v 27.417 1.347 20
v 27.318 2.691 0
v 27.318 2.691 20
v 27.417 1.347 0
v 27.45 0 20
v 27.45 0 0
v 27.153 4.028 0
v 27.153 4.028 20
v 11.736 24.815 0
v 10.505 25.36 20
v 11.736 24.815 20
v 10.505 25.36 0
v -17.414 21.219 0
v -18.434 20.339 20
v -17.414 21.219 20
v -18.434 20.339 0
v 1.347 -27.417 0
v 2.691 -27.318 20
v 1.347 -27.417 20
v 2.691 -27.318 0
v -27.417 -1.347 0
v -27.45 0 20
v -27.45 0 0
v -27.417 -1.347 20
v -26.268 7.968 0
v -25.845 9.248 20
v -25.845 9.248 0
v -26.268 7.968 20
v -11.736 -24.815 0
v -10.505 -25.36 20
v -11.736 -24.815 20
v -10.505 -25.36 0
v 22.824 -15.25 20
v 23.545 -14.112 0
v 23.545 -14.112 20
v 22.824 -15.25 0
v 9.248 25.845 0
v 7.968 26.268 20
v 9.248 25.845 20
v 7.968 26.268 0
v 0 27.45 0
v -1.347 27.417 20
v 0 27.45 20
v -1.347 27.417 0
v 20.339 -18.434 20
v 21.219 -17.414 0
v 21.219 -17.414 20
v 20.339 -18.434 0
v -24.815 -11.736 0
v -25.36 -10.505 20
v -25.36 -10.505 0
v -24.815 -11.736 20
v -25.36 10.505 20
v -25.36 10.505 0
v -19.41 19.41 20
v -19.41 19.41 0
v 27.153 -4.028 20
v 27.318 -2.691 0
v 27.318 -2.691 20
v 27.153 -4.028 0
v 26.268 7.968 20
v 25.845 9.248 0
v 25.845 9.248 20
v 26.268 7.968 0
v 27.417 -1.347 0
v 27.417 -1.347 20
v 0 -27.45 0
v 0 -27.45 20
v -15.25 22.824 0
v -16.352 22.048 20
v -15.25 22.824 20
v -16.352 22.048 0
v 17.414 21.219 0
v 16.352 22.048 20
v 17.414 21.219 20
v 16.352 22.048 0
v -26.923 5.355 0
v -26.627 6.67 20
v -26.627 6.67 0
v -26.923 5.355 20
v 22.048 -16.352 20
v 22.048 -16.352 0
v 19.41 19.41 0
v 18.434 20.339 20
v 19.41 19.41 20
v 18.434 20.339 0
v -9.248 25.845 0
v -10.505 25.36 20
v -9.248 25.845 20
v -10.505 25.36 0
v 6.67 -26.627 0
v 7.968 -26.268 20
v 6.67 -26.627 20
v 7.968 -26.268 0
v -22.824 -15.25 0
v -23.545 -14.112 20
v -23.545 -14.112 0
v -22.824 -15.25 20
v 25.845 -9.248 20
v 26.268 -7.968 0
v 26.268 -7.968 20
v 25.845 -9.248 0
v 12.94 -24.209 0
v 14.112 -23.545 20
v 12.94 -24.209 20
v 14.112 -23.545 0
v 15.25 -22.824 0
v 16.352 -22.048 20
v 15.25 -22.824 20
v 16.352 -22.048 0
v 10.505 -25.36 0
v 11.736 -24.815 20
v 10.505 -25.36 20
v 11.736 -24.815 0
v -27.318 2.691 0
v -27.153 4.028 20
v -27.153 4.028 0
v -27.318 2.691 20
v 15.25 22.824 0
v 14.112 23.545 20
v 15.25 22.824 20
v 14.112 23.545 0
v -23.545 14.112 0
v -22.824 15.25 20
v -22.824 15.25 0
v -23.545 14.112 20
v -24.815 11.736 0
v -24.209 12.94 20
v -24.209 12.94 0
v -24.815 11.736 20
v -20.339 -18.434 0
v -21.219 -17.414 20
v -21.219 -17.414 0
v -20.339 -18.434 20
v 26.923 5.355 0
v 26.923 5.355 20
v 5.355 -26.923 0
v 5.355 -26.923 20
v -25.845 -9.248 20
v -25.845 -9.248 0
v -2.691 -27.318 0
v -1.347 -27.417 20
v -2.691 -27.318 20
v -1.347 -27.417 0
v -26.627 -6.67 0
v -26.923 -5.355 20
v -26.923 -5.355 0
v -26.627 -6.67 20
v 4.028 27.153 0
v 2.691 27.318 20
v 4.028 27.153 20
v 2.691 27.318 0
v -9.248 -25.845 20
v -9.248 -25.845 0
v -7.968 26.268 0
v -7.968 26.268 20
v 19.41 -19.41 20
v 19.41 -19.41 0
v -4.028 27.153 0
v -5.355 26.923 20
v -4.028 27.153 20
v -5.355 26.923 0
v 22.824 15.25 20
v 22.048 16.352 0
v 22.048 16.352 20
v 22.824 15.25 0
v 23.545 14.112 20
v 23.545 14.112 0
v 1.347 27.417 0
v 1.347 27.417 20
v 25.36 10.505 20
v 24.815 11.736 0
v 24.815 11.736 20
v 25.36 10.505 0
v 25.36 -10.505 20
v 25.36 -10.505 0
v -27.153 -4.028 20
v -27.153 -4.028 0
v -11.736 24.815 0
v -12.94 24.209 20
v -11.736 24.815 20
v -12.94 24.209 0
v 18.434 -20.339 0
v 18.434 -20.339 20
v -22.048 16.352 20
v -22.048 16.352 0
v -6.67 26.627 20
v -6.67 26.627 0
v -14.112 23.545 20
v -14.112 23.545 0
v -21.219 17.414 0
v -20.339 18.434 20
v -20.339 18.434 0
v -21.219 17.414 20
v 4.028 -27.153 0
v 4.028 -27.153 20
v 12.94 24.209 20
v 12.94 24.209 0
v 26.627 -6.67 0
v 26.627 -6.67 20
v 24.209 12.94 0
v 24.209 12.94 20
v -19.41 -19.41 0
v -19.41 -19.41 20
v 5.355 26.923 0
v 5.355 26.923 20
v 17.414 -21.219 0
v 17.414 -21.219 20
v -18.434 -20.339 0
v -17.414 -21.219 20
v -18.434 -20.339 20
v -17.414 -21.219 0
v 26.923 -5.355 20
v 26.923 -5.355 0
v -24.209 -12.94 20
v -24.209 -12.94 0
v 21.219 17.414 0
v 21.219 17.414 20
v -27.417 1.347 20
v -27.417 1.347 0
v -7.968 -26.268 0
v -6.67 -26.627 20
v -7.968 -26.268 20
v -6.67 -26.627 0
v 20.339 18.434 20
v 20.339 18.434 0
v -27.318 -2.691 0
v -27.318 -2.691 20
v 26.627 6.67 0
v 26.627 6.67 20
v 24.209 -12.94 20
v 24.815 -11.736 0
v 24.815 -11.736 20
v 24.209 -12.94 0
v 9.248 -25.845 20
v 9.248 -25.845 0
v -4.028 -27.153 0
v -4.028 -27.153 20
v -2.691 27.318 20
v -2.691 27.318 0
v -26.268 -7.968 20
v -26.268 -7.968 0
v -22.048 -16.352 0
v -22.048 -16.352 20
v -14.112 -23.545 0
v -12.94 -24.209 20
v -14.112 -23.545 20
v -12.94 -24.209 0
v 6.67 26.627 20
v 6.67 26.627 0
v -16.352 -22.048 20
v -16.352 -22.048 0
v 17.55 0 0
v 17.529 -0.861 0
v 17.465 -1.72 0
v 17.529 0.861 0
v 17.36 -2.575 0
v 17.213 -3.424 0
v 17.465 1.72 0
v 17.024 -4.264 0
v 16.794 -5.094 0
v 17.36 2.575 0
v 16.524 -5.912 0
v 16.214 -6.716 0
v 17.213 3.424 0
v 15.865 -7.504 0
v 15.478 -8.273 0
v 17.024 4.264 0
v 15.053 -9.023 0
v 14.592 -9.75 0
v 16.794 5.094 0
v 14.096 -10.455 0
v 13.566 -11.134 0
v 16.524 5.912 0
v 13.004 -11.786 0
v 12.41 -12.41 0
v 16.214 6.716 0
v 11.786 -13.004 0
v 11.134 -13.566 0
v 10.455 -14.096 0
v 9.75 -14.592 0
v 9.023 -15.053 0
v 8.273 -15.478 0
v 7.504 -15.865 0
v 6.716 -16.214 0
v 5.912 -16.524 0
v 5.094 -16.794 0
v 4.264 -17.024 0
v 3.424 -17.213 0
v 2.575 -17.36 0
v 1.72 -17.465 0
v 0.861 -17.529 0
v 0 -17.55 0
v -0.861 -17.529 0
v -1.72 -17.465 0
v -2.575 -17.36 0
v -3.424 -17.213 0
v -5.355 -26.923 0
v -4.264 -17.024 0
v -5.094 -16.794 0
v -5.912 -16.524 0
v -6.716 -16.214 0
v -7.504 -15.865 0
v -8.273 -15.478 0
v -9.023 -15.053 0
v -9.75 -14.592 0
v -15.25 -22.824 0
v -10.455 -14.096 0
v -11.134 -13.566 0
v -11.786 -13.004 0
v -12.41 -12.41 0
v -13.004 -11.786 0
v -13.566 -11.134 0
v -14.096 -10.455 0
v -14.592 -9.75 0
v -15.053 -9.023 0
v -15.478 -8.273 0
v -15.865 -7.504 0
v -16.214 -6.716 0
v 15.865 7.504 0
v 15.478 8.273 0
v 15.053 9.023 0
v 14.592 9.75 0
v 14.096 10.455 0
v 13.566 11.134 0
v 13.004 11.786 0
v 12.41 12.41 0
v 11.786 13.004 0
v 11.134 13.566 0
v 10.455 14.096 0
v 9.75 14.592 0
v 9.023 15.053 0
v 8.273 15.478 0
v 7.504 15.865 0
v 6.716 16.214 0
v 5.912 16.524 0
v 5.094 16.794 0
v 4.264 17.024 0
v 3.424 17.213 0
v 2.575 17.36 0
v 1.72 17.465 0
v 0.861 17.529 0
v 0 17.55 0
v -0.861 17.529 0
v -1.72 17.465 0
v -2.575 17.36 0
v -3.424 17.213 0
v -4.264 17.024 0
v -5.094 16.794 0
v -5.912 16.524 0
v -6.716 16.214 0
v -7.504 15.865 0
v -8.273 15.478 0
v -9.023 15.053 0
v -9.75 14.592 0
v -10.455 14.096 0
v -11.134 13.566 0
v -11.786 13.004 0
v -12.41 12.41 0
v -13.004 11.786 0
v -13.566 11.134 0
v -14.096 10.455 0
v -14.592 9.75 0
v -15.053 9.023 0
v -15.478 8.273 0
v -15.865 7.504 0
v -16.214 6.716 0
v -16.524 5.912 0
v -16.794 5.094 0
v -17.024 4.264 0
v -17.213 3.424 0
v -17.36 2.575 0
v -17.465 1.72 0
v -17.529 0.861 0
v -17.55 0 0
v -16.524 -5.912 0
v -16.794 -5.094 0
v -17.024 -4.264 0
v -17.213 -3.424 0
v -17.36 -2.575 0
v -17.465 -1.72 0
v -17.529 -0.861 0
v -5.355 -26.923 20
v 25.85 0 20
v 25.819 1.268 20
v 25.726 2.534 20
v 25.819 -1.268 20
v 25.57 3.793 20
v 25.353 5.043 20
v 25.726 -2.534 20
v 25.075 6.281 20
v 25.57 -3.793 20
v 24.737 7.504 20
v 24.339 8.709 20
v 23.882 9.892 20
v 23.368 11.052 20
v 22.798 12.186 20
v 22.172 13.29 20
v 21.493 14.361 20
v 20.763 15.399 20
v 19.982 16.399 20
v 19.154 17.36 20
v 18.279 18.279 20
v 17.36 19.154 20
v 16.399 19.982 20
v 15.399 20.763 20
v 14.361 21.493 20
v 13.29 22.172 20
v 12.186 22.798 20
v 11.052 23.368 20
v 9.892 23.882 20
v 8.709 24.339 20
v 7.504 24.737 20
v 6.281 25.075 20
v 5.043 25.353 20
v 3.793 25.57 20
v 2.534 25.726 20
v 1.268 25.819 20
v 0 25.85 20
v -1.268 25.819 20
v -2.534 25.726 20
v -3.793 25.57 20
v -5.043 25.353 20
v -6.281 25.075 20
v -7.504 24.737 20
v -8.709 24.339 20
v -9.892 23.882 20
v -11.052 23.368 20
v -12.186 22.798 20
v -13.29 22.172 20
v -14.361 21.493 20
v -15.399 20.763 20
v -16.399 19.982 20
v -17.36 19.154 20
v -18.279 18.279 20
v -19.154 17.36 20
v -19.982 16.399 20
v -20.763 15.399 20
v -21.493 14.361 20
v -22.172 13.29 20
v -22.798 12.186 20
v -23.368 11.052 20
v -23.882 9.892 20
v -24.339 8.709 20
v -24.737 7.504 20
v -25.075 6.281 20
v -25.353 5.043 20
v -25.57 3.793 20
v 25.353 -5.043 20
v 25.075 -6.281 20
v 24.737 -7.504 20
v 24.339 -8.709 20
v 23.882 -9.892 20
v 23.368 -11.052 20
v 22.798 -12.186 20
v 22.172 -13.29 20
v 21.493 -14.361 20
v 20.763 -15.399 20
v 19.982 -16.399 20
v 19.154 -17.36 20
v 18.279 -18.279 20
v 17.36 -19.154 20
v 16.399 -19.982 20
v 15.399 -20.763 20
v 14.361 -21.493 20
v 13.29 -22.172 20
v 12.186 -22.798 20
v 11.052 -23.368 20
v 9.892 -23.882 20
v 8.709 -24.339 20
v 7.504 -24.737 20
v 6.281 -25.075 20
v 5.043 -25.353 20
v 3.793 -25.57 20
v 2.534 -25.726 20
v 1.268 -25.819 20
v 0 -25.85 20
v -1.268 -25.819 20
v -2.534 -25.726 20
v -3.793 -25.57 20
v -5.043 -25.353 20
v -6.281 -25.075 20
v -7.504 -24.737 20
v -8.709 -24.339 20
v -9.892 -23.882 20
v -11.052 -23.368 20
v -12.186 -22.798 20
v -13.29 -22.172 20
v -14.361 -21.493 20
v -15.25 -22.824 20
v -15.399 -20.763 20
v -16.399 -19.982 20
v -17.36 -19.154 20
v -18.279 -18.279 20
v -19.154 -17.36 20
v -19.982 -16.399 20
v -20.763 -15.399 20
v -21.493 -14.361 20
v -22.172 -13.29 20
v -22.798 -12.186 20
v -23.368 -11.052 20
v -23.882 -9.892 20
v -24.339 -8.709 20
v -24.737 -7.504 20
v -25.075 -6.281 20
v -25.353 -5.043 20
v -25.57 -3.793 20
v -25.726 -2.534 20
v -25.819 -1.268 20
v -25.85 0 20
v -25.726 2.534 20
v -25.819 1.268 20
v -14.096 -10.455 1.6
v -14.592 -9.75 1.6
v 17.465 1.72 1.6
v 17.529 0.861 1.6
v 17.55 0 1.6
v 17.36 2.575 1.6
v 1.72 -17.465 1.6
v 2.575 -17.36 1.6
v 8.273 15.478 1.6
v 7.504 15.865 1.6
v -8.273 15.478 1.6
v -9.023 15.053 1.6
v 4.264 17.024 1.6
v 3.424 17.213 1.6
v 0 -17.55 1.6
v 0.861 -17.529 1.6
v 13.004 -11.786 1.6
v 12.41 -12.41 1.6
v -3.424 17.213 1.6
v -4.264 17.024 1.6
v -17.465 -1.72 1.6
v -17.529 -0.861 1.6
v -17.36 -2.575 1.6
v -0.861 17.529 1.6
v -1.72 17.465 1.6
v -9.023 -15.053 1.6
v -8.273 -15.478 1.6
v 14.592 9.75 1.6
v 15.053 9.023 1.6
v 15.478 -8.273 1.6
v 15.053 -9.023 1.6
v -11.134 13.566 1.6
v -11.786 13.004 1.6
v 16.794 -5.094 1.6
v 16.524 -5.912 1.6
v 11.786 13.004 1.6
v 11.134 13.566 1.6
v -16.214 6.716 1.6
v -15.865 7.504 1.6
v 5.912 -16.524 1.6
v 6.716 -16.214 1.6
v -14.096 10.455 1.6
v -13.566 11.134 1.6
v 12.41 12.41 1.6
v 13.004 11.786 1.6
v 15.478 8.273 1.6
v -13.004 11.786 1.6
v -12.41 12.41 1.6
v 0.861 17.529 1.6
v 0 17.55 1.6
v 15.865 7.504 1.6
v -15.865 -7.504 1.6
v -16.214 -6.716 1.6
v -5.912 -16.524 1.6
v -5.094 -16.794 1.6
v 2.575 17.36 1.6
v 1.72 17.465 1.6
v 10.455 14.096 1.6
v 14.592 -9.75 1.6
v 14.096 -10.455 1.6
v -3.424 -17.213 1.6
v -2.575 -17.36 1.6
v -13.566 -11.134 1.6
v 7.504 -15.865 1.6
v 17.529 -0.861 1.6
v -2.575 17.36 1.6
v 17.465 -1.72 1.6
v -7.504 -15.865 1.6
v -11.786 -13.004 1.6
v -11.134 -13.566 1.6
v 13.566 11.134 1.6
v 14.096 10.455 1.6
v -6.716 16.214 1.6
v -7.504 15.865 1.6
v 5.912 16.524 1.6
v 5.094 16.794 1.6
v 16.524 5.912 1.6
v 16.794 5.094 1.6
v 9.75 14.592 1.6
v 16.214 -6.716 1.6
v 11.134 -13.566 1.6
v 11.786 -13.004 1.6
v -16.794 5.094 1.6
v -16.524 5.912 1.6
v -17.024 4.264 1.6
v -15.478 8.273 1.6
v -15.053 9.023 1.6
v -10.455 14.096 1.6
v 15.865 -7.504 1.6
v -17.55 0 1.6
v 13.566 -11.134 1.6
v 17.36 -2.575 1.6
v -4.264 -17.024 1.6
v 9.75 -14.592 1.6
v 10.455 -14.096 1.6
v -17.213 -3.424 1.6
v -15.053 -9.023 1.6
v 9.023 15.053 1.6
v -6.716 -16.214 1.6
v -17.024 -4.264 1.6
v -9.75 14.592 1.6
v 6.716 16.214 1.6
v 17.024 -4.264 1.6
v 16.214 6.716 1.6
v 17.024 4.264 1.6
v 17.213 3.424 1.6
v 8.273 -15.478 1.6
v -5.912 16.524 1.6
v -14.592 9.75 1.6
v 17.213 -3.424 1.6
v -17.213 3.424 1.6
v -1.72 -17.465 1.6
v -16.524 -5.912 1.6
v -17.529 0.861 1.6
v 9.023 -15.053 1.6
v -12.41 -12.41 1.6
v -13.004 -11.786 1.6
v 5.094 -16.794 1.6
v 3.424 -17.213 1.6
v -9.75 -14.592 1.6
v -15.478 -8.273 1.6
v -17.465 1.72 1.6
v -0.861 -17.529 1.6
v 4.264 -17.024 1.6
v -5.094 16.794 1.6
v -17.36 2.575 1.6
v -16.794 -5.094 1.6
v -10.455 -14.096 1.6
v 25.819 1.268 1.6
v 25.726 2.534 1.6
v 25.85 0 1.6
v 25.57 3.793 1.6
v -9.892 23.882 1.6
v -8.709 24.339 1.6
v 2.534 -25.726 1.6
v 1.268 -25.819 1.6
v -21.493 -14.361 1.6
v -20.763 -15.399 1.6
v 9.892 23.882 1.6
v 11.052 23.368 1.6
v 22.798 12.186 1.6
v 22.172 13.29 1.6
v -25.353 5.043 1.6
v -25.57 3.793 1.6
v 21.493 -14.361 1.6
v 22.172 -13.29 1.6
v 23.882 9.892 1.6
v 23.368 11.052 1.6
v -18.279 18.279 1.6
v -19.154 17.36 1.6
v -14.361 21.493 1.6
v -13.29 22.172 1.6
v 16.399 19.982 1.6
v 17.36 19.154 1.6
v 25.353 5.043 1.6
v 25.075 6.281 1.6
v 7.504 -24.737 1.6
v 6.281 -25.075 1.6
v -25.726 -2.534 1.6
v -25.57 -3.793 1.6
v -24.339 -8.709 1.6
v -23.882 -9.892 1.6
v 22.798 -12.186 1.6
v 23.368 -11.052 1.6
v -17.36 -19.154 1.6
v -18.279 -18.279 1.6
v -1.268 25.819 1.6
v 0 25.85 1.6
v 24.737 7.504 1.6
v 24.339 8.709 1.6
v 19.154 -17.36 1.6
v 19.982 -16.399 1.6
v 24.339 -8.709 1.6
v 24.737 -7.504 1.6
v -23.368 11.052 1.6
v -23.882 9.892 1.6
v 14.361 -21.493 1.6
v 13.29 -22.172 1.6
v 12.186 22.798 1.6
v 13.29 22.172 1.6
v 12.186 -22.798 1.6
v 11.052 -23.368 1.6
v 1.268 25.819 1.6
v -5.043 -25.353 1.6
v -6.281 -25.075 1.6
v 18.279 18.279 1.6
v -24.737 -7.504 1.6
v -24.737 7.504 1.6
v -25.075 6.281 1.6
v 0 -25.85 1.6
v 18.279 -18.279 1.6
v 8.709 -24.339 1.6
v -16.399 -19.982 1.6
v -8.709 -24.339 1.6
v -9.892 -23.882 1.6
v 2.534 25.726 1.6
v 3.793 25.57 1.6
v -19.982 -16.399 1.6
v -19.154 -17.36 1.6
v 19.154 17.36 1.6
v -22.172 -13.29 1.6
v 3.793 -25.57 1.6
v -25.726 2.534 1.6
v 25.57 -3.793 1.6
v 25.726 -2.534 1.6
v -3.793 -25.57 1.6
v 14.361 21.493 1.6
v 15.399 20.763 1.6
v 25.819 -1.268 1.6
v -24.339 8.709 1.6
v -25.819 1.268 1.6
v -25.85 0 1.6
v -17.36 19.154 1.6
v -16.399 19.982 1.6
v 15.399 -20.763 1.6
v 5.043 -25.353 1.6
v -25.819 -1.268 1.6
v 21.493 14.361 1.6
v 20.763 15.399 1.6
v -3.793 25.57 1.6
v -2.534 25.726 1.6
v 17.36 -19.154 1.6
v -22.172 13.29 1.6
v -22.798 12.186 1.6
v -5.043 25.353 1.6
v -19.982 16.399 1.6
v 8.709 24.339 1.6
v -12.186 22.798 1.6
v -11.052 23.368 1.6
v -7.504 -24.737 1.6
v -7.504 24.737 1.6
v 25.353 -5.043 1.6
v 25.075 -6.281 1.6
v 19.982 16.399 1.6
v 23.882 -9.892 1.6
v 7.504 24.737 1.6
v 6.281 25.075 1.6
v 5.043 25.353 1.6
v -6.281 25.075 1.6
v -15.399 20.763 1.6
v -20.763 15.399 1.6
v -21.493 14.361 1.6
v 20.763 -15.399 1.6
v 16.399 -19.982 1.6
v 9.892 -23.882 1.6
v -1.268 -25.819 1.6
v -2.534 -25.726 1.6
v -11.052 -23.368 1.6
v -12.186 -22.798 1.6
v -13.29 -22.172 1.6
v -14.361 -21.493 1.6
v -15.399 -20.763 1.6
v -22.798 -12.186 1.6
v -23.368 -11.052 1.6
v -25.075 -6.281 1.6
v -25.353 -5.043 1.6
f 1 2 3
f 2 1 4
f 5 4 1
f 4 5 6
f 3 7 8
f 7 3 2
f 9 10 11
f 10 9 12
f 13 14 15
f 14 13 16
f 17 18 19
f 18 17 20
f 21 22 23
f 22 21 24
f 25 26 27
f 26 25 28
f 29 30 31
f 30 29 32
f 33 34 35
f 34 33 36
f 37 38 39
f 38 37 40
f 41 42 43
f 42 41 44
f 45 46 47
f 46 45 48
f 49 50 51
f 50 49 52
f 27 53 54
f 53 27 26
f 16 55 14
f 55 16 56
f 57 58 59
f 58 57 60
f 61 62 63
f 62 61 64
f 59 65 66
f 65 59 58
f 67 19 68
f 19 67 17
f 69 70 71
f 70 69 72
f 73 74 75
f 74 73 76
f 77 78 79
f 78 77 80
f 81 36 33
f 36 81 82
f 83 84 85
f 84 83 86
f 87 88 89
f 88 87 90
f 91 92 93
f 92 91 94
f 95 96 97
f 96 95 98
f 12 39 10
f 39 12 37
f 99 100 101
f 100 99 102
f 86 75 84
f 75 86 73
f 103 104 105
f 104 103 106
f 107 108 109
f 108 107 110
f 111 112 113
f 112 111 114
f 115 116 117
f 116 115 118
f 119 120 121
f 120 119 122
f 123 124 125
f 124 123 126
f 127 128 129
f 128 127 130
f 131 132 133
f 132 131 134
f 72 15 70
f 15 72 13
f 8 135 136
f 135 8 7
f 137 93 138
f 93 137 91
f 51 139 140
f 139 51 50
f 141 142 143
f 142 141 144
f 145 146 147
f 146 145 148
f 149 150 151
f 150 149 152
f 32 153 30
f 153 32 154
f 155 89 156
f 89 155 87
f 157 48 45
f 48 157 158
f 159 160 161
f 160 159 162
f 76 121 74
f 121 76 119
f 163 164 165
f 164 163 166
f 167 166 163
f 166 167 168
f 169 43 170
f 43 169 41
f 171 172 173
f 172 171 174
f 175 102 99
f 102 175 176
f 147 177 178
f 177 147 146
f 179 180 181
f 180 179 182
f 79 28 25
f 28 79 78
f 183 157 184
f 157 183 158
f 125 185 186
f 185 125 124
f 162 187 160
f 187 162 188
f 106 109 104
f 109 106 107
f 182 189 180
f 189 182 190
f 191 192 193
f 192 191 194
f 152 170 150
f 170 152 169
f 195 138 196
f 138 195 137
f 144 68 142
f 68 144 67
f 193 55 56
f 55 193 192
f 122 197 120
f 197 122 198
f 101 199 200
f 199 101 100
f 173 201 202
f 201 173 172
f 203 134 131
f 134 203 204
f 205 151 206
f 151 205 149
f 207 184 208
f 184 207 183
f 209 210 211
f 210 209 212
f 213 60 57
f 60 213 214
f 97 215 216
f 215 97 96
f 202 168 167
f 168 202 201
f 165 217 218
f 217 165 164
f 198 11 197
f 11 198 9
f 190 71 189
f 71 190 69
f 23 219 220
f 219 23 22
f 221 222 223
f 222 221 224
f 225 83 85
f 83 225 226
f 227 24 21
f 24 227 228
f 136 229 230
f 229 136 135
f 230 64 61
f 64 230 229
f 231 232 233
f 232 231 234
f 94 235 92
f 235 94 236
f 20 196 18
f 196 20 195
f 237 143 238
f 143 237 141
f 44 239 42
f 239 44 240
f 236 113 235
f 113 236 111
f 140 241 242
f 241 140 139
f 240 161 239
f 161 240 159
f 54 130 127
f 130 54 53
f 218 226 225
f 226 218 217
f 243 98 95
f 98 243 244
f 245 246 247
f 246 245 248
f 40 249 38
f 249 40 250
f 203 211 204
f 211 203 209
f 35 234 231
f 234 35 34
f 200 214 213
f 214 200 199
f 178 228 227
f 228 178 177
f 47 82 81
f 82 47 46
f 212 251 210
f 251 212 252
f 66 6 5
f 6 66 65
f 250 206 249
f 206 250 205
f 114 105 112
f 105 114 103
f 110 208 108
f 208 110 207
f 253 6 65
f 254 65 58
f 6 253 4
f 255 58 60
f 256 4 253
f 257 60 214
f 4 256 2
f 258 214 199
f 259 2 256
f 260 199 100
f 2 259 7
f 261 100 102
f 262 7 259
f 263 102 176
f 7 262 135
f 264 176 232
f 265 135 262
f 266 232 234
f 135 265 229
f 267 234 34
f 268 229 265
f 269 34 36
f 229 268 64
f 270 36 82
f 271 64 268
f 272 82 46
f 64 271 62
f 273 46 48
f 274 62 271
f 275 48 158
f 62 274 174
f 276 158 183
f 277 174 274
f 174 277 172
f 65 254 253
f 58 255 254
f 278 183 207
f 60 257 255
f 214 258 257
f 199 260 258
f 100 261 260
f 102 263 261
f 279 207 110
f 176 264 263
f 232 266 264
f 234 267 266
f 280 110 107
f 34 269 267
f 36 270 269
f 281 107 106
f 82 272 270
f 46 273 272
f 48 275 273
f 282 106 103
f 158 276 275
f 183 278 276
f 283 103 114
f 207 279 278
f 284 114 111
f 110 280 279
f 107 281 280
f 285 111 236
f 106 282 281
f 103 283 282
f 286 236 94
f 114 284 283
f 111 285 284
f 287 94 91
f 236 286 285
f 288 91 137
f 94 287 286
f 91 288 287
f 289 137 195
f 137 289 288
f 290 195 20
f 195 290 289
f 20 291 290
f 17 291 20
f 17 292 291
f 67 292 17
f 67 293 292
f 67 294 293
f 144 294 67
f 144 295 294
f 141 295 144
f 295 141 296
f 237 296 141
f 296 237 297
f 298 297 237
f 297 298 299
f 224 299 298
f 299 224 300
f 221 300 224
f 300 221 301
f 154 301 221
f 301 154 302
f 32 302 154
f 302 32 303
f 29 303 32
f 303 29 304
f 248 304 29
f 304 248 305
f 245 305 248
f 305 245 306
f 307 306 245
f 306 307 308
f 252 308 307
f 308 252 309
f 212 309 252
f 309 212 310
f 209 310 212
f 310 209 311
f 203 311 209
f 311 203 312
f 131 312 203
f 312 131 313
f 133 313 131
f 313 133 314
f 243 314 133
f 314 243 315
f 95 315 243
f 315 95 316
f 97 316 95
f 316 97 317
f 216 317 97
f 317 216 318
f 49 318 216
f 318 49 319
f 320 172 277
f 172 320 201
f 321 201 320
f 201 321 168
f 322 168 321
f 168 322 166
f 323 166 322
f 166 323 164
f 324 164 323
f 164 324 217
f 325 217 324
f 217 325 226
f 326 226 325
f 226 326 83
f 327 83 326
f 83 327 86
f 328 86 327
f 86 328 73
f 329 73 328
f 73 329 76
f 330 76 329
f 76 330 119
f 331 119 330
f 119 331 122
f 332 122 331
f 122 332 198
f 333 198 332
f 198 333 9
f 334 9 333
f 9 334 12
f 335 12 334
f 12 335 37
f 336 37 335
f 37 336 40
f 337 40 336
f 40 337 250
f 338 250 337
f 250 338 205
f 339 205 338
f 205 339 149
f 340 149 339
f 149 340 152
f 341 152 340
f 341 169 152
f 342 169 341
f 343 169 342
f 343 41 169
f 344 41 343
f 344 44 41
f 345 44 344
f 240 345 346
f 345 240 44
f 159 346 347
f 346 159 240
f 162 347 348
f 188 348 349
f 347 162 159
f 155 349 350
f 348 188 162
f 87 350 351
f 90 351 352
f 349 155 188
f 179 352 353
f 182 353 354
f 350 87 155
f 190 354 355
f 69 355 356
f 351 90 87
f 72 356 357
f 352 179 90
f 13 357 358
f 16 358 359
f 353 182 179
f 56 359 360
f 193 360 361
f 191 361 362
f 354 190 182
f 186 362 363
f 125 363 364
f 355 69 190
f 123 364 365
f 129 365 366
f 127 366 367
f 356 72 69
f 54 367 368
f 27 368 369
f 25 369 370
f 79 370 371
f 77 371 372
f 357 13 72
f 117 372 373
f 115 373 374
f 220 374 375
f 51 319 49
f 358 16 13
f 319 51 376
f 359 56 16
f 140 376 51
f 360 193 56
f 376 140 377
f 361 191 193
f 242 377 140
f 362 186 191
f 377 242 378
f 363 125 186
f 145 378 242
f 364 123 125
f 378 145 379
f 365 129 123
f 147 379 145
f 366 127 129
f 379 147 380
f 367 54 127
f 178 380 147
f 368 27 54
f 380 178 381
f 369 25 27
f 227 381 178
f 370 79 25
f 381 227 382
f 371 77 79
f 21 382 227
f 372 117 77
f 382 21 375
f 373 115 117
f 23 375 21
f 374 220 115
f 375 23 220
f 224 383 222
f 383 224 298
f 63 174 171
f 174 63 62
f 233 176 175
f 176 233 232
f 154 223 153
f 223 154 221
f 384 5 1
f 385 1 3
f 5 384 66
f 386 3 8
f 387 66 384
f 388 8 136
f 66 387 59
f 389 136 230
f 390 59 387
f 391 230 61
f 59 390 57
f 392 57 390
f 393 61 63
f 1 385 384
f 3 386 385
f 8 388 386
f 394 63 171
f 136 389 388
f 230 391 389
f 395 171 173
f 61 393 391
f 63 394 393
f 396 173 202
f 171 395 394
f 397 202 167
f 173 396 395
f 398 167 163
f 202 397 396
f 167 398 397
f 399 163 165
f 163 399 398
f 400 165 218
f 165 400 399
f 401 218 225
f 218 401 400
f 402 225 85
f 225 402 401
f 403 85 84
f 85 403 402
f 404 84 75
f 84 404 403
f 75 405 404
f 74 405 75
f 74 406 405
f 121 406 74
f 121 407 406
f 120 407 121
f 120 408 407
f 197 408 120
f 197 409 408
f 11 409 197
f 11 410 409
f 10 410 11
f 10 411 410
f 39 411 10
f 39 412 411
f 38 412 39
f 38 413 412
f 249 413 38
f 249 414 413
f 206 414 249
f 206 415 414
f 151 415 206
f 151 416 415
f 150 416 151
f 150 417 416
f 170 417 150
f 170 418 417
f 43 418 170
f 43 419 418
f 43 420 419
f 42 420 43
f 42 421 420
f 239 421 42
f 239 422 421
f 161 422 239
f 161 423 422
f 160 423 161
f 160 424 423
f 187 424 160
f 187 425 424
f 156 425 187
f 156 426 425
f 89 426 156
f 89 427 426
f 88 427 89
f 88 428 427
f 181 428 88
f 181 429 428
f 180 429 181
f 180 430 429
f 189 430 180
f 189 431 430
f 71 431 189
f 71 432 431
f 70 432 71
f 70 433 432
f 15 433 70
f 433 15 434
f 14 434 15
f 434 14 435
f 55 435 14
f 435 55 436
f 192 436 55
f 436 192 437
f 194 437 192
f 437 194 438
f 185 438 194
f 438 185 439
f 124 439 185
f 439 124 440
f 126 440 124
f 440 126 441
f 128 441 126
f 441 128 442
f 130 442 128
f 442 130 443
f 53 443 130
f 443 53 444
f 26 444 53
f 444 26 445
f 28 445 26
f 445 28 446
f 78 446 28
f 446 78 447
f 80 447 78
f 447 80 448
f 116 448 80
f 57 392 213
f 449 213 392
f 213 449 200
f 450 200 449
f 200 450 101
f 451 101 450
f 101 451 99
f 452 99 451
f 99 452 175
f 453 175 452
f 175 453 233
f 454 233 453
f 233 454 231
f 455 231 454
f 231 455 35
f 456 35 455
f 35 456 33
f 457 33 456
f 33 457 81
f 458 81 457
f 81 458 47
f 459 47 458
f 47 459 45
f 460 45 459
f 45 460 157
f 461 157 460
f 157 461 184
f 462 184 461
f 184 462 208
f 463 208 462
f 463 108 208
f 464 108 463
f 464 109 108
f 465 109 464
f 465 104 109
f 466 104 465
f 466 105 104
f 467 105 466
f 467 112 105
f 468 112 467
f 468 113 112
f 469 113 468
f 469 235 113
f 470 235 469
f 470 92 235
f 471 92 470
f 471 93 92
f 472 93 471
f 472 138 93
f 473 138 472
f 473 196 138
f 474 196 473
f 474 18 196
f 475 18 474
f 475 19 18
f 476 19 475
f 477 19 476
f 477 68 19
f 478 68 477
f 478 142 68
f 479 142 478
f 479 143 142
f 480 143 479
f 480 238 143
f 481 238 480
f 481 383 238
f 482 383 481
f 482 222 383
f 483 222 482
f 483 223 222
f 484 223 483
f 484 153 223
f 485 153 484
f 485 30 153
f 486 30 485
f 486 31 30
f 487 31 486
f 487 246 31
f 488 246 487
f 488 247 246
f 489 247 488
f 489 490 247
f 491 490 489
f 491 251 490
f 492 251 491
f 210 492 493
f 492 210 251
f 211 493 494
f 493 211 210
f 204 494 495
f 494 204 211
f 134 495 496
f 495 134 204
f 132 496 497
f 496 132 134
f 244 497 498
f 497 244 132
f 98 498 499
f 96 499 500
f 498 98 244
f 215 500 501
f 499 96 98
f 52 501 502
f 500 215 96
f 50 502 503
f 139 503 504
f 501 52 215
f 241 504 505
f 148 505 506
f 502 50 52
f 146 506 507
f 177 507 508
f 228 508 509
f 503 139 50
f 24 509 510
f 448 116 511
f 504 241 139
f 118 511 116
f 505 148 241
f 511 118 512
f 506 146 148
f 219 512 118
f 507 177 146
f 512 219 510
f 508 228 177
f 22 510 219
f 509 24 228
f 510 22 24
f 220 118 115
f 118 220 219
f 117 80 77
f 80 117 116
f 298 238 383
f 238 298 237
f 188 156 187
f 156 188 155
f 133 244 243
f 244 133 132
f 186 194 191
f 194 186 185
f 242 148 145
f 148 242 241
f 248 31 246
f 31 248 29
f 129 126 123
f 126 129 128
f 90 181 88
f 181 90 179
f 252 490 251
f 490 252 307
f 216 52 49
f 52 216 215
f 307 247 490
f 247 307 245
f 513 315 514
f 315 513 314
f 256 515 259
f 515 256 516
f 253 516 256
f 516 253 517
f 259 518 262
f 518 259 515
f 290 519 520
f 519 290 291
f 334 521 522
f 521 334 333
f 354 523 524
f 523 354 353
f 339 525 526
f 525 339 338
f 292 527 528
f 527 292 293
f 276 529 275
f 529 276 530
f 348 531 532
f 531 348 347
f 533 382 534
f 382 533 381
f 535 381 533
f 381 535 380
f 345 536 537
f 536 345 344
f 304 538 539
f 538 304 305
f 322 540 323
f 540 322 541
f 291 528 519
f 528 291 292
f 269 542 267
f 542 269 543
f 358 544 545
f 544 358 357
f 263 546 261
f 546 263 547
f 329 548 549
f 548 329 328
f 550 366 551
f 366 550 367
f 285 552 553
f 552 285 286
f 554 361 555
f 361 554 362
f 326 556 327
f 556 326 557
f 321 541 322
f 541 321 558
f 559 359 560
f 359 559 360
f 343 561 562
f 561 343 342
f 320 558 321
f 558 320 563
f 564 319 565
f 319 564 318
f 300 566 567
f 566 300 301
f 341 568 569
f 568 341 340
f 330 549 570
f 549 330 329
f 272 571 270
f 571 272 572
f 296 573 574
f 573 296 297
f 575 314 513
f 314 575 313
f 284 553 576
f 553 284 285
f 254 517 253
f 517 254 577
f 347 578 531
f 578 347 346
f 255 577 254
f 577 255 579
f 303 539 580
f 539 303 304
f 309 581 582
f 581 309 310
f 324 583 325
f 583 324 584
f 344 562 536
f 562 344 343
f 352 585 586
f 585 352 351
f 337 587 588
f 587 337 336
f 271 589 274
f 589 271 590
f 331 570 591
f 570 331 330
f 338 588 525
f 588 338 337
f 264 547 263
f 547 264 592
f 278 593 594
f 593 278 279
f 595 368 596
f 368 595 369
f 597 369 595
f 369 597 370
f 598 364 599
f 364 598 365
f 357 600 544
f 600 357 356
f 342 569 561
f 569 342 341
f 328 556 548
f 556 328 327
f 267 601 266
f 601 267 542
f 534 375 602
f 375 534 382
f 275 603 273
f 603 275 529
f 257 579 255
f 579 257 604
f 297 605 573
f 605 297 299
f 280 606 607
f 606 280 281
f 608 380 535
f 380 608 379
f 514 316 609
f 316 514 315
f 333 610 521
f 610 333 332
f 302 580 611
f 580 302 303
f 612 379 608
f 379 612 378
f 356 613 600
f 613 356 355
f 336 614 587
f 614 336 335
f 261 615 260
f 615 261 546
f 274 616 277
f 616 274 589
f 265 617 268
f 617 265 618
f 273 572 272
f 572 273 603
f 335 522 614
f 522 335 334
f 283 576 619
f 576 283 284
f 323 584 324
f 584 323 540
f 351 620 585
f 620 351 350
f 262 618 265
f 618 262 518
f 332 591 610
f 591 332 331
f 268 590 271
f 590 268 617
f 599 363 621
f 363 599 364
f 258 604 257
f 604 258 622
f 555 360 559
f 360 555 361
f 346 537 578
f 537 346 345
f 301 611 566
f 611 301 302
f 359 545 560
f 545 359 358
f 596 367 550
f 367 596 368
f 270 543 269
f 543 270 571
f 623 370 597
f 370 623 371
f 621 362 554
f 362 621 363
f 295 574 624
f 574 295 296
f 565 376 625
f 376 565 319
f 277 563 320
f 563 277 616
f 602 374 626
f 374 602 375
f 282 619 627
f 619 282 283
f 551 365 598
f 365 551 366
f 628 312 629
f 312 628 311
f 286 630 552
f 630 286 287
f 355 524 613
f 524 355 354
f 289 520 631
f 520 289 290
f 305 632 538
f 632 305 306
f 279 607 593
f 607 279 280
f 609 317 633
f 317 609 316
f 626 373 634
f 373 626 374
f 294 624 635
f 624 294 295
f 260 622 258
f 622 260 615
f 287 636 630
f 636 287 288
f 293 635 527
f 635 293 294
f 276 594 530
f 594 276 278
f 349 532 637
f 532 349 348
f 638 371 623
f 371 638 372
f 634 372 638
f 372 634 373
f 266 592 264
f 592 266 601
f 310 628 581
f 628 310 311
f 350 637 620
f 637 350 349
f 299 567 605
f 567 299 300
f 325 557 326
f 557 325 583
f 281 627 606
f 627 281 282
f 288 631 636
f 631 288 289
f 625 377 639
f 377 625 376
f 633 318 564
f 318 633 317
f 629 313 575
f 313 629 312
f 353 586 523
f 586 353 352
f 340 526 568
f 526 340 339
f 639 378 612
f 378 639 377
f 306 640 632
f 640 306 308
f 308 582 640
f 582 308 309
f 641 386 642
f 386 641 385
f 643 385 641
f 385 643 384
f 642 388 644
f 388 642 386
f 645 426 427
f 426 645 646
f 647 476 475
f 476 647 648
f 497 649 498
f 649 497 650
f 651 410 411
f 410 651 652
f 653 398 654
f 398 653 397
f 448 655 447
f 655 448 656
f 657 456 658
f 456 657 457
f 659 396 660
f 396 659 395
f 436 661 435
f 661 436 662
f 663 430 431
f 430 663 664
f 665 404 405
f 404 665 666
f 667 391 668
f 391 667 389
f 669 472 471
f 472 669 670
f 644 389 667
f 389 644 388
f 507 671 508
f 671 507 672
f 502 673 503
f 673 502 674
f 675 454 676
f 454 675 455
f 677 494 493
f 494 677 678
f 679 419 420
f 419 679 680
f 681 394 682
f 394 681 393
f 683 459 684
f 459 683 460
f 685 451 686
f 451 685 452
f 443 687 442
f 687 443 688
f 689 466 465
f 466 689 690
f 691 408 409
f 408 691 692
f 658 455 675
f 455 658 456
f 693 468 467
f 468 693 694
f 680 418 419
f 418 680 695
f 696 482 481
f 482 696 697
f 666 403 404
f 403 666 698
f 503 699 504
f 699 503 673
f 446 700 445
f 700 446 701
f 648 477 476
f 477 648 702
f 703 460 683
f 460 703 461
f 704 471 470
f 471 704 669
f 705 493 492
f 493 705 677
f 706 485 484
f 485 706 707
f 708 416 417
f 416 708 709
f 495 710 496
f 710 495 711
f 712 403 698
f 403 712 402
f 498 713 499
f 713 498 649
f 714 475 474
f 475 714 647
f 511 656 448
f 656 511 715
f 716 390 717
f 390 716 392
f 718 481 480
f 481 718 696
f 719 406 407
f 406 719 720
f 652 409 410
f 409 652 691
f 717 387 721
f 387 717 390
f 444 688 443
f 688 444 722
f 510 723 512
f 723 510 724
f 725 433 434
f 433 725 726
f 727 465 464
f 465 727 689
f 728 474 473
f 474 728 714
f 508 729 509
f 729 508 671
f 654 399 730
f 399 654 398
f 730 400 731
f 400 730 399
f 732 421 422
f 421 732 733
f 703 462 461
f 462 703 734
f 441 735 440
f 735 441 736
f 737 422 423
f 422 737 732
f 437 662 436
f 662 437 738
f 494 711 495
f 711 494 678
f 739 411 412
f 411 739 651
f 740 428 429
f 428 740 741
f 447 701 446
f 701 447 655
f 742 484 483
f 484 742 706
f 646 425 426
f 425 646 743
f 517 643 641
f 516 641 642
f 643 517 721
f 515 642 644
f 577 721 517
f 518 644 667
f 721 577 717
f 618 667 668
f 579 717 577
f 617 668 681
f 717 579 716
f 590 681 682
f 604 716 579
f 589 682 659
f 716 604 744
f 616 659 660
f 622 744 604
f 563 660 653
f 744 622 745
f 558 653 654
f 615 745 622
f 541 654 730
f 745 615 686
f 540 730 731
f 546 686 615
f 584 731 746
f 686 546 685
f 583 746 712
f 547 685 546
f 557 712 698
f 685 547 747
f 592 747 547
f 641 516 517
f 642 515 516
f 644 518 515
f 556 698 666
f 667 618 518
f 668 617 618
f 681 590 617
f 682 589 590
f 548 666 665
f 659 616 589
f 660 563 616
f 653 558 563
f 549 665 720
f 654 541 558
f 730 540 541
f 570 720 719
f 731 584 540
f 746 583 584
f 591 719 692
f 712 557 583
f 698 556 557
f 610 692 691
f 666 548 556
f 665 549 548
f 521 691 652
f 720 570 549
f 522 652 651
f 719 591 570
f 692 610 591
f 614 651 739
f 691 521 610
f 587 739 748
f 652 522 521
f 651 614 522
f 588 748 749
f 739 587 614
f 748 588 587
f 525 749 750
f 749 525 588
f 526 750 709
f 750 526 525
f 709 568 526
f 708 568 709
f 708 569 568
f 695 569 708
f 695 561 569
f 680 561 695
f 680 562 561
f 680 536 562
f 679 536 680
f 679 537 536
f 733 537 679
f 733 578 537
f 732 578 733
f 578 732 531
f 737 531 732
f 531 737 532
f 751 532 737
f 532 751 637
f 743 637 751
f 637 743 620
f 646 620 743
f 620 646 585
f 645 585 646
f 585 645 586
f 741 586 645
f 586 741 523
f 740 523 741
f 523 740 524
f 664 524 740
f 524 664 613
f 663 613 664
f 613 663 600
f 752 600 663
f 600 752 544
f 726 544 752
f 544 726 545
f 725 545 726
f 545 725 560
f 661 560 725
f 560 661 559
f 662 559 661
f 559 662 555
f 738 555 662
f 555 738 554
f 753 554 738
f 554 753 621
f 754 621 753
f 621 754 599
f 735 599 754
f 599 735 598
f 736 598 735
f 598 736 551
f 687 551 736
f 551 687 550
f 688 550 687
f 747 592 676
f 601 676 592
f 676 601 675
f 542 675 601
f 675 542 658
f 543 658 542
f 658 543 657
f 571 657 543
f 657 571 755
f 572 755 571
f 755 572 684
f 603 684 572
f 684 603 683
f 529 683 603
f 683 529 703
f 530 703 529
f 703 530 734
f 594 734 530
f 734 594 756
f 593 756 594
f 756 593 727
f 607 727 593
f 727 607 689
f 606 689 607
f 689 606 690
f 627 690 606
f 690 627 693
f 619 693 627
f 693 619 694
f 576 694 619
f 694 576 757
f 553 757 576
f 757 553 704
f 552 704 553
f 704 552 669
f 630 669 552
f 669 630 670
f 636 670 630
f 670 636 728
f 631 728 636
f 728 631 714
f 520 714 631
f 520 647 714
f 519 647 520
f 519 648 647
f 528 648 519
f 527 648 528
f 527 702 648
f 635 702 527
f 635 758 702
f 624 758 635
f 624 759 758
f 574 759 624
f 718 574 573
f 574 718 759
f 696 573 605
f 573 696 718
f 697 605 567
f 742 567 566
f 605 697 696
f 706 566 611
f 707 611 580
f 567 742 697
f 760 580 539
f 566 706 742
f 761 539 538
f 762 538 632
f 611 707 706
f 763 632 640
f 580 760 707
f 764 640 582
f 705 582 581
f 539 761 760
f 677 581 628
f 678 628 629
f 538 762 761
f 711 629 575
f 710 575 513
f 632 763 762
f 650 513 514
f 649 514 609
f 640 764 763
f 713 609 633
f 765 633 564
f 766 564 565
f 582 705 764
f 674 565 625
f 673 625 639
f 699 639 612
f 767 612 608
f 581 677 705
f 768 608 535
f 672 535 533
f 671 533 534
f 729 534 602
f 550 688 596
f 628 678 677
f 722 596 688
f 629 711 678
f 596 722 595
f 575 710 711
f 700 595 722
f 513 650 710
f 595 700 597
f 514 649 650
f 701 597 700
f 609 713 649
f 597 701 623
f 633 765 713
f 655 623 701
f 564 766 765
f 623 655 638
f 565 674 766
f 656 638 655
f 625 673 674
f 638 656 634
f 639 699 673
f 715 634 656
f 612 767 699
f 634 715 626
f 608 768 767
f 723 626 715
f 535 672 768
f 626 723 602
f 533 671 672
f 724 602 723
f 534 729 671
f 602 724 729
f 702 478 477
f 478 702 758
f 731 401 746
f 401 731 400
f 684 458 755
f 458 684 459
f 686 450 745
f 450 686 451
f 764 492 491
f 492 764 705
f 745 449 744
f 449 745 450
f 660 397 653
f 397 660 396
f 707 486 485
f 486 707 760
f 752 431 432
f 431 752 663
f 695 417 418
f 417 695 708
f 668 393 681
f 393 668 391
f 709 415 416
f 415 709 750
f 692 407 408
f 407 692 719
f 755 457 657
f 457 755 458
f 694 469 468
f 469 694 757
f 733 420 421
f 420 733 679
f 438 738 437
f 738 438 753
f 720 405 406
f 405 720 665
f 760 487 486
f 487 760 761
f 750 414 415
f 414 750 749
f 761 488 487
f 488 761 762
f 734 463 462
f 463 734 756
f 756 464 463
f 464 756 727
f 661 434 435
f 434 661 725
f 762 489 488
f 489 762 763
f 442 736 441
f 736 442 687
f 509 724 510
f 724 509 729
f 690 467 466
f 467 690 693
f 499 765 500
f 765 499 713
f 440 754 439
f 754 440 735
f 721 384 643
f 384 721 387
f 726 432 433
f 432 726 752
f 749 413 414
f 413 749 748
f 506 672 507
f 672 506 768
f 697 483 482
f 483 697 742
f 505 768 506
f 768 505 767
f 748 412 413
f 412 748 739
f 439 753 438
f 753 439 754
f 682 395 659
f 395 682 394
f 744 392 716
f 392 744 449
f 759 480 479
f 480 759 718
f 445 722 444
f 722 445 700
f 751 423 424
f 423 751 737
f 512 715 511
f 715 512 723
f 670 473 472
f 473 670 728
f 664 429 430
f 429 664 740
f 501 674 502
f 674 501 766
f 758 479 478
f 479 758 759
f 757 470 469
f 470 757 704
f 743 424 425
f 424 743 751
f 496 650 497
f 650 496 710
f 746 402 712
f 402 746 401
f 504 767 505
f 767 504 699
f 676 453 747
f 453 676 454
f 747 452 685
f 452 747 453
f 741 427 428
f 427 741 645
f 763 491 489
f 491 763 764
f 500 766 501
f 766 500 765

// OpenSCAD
eps=.1;
H=20;
D1=35+eps;
D2=55-eps;
W=1.6;

$fn=128;

difference() {
    cylinder(d=D2,h=H);
    cylinder(d=D1,h=3*H,center=true);
    translate([0,0,W])
    cylinder(d=D2-2*W,h=H);
}
